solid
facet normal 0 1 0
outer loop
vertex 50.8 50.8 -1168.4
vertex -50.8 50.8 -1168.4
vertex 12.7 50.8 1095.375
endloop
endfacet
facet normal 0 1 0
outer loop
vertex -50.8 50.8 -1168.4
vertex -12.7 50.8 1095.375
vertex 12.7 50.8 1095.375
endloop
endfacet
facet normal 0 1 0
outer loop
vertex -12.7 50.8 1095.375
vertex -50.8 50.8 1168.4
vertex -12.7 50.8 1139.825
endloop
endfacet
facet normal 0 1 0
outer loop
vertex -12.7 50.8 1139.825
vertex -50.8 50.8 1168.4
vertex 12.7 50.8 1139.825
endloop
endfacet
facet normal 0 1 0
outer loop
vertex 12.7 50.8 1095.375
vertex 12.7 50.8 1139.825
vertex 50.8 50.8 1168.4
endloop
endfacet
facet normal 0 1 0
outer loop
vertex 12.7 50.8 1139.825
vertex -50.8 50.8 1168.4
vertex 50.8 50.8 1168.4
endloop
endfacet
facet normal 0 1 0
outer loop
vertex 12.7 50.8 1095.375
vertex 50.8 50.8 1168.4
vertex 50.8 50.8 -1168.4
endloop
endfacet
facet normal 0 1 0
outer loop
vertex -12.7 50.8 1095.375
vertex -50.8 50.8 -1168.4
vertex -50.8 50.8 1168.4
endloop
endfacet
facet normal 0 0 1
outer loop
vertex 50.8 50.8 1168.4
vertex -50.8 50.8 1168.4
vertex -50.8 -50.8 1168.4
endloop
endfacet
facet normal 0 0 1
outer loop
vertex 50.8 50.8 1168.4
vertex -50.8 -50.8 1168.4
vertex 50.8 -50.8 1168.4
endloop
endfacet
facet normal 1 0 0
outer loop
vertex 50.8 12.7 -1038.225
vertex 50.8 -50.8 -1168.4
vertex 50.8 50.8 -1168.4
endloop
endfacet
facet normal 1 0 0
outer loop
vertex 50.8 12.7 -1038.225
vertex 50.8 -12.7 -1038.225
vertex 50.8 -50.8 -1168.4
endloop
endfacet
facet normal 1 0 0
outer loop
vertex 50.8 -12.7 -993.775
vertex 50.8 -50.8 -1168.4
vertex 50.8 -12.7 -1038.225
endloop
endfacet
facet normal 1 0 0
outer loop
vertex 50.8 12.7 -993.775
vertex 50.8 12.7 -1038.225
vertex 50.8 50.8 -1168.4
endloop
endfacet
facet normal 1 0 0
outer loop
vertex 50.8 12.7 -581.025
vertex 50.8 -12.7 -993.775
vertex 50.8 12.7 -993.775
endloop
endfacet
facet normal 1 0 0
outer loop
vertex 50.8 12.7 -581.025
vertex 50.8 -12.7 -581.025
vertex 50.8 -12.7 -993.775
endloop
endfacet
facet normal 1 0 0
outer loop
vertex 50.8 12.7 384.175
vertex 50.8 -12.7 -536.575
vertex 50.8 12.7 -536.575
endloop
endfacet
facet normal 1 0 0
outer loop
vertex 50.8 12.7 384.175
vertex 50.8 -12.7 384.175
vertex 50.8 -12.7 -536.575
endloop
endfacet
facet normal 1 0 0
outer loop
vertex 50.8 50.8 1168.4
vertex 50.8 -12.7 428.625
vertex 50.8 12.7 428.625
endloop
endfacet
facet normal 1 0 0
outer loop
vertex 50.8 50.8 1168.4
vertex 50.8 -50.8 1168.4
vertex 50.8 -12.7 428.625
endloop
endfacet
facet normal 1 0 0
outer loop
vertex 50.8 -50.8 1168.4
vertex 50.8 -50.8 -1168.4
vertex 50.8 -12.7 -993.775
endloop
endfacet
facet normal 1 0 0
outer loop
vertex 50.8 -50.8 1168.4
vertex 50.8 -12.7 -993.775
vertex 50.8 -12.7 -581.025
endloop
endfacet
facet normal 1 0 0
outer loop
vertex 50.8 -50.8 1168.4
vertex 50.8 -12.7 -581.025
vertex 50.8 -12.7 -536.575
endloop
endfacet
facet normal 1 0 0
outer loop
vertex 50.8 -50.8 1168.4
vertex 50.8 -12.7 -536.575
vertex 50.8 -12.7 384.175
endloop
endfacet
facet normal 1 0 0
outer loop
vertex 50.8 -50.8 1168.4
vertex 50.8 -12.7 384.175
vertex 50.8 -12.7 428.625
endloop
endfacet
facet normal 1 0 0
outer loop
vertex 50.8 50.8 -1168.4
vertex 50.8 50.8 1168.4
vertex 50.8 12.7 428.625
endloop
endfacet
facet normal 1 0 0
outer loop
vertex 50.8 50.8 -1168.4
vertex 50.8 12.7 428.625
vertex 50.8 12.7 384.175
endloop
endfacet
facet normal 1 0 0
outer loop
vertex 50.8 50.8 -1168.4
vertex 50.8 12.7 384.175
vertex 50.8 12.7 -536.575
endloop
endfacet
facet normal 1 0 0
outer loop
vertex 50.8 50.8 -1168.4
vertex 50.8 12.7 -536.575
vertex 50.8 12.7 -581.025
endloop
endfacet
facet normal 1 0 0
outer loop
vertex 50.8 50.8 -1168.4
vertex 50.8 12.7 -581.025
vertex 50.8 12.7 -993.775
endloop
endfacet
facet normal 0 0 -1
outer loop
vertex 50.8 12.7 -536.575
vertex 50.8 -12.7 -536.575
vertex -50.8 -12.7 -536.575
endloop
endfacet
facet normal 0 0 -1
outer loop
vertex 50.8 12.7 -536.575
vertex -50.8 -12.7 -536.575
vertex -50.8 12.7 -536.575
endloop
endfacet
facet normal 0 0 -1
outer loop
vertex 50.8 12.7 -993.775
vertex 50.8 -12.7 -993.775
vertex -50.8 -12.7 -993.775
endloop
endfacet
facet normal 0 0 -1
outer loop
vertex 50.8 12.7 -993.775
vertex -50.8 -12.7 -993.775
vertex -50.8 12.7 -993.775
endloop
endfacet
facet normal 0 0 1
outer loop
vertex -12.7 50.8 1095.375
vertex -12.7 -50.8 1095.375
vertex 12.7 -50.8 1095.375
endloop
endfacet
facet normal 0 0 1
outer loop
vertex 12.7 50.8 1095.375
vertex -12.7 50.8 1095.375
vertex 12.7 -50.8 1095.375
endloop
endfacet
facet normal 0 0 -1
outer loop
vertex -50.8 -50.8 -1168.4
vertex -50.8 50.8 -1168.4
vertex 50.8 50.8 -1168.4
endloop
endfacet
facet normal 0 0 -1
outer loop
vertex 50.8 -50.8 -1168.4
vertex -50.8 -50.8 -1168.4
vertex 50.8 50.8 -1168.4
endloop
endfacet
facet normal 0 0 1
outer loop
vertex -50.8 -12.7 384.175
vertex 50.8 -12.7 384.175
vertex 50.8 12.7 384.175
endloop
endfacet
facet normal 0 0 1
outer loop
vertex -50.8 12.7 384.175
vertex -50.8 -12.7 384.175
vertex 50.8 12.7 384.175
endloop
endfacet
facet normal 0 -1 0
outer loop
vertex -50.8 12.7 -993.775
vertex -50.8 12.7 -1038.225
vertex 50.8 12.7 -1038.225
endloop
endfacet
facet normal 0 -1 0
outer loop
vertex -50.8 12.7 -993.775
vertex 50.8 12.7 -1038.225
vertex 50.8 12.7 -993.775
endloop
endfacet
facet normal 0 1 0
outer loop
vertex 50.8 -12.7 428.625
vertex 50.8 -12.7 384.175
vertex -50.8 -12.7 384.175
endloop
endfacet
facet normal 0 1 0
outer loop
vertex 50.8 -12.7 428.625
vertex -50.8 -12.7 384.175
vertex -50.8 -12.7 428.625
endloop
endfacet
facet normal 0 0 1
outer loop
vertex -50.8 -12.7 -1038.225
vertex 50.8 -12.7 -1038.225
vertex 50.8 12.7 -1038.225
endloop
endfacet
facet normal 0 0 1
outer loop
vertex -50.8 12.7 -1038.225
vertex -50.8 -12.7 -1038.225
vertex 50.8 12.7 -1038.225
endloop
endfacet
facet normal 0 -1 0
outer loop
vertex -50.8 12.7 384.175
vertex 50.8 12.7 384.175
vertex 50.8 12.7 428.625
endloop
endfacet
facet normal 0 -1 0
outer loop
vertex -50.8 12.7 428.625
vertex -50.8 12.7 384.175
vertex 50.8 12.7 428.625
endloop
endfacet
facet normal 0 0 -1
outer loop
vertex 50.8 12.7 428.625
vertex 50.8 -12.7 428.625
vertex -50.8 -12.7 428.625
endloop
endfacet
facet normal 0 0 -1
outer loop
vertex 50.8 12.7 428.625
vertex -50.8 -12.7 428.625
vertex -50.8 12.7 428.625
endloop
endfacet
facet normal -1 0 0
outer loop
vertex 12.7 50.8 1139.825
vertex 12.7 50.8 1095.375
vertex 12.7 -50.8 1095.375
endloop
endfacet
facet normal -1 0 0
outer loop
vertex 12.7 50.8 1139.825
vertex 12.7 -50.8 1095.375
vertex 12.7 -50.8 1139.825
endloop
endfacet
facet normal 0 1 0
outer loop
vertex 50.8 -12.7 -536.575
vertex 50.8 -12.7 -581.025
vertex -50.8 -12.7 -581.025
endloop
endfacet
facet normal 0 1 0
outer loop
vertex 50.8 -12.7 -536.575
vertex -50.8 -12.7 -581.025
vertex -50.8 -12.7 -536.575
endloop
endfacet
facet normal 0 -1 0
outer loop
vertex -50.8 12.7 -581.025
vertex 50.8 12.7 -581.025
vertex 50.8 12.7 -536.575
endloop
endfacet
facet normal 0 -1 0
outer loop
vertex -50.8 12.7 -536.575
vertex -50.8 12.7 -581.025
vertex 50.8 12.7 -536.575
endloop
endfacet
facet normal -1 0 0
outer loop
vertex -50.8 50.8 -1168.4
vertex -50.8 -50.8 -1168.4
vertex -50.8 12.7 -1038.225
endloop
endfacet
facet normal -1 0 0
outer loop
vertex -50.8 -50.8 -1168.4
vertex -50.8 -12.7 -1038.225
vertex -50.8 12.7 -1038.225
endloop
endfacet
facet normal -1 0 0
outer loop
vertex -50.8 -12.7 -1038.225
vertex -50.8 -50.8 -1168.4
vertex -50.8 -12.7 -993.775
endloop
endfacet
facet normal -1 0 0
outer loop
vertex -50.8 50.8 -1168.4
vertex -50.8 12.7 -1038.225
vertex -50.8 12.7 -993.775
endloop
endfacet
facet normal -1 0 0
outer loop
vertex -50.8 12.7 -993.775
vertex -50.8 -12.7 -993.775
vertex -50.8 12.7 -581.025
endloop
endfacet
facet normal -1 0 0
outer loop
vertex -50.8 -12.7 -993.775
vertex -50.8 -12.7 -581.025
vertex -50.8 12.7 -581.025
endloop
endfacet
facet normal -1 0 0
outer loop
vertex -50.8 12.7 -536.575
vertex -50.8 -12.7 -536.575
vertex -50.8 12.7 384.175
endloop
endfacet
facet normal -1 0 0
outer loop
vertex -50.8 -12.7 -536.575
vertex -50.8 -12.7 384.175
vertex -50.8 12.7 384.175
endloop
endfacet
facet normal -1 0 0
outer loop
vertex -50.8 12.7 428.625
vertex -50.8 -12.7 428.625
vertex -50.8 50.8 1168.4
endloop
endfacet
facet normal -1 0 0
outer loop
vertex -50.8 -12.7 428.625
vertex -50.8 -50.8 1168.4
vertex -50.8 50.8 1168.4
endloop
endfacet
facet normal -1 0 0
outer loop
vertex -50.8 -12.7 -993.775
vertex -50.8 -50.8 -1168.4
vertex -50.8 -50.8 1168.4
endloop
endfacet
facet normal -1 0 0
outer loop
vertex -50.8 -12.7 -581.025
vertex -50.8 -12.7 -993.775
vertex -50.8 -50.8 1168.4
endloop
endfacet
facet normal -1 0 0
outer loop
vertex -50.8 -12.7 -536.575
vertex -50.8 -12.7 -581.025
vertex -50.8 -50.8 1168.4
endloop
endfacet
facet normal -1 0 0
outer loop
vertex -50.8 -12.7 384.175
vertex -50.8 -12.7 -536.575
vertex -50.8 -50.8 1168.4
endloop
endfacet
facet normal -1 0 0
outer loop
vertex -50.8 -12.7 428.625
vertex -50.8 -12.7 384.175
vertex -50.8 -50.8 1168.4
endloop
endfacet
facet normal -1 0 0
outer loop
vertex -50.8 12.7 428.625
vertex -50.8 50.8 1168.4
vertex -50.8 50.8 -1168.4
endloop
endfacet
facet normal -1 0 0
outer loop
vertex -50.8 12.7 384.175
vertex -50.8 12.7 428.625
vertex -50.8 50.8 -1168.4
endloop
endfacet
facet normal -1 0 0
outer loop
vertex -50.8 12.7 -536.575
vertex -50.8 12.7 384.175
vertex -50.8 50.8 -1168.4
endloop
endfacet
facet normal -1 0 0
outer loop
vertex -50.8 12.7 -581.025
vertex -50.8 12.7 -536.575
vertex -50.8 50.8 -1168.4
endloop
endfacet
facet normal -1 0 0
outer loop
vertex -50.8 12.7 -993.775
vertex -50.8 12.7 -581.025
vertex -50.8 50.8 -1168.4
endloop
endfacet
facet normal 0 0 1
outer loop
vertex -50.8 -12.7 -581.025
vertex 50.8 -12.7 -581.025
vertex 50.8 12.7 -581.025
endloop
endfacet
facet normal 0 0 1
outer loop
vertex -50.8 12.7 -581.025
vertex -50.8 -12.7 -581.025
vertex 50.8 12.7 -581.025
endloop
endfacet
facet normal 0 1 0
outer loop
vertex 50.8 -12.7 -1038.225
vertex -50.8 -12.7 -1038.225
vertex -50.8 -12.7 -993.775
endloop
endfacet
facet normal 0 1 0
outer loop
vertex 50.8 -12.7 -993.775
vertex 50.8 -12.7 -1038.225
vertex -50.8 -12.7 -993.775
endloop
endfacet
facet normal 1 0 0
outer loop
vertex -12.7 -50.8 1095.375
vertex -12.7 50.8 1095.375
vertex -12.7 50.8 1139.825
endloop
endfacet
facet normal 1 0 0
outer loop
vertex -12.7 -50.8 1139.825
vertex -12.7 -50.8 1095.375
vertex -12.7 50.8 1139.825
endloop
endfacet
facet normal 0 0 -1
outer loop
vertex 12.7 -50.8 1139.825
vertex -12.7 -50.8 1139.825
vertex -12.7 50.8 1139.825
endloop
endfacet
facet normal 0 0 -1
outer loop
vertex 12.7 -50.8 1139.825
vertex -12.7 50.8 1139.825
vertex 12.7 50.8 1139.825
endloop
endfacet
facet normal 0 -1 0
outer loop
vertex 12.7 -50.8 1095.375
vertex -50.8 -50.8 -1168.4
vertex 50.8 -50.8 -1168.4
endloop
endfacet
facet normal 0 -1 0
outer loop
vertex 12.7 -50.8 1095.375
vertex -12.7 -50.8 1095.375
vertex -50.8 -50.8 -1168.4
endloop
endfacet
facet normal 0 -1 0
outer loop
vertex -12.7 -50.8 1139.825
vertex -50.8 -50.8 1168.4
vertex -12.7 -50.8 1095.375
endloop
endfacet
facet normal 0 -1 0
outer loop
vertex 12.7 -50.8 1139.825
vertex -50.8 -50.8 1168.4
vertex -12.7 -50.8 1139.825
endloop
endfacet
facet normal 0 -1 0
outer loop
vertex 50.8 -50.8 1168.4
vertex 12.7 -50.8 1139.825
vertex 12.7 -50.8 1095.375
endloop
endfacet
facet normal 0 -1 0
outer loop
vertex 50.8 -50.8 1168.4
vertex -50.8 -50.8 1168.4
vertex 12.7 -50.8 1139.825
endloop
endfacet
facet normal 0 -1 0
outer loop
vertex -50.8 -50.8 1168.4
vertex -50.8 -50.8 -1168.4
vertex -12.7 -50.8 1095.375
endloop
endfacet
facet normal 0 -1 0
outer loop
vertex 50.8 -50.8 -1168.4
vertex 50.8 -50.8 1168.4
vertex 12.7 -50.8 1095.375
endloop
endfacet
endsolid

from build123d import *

# Parameters (mm, degrees)
F0_W     = 101.6
F0_H     = 101.6
F1_DEPTH = 1168.4
F2_W     = 25.4
F2_H     = 44.45
F3_DEPTH = 101.601
F4_W     = 25.4
F4_H     = 44.45
F5_DEPTH = 101.601
F6_W     = 25.4
F6_H     = 44.45
F7_DEPTH = 101.601
F8_W     = 25.4
F8_H     = 44.45
F9_DEPTH = 101.601


with BuildPart() as f1:
    # F0 (on Top) → F1 (new body, symmetric)
    with BuildSketch(Plane.XY):
        Rectangle(F0_W, F0_H)
    extrude(amount=F1_DEPTH, both=True)

    # F2 (on face) → F3 (cut, through all)
    with BuildSketch(Plane.XZ.offset(50.8)):
        with Locations((0, 1117.6)):
            Rectangle(F2_W, F2_H)
    extrude(amount=-F3_DEPTH, mode=Mode.SUBTRACT)

    # F4 (on face) → F5 (cut, through all)
    with BuildSketch(Plane.YZ.offset(50.8)):
        with Locations((0, 406.4)):
            Rectangle(F4_W, F4_H)
    extrude(amount=-F5_DEPTH, mode=Mode.SUBTRACT)

    # F6 (on face) → F7 (cut, through all)
    with BuildSketch(Plane.YZ.offset(50.8)):
        with Locations((0, -558.8)):
            Rectangle(F6_W, F6_H)
    extrude(amount=-F7_DEPTH, mode=Mode.SUBTRACT)

    # F8 (on face) → F9 (cut, through all)
    with BuildSketch(Plane.YZ.offset(50.8)):
        with Locations((0, -1016)):
            Rectangle(F8_W, F8_H)
    extrude(amount=-F9_DEPTH, mode=Mode.SUBTRACT)


solid = f1.part
